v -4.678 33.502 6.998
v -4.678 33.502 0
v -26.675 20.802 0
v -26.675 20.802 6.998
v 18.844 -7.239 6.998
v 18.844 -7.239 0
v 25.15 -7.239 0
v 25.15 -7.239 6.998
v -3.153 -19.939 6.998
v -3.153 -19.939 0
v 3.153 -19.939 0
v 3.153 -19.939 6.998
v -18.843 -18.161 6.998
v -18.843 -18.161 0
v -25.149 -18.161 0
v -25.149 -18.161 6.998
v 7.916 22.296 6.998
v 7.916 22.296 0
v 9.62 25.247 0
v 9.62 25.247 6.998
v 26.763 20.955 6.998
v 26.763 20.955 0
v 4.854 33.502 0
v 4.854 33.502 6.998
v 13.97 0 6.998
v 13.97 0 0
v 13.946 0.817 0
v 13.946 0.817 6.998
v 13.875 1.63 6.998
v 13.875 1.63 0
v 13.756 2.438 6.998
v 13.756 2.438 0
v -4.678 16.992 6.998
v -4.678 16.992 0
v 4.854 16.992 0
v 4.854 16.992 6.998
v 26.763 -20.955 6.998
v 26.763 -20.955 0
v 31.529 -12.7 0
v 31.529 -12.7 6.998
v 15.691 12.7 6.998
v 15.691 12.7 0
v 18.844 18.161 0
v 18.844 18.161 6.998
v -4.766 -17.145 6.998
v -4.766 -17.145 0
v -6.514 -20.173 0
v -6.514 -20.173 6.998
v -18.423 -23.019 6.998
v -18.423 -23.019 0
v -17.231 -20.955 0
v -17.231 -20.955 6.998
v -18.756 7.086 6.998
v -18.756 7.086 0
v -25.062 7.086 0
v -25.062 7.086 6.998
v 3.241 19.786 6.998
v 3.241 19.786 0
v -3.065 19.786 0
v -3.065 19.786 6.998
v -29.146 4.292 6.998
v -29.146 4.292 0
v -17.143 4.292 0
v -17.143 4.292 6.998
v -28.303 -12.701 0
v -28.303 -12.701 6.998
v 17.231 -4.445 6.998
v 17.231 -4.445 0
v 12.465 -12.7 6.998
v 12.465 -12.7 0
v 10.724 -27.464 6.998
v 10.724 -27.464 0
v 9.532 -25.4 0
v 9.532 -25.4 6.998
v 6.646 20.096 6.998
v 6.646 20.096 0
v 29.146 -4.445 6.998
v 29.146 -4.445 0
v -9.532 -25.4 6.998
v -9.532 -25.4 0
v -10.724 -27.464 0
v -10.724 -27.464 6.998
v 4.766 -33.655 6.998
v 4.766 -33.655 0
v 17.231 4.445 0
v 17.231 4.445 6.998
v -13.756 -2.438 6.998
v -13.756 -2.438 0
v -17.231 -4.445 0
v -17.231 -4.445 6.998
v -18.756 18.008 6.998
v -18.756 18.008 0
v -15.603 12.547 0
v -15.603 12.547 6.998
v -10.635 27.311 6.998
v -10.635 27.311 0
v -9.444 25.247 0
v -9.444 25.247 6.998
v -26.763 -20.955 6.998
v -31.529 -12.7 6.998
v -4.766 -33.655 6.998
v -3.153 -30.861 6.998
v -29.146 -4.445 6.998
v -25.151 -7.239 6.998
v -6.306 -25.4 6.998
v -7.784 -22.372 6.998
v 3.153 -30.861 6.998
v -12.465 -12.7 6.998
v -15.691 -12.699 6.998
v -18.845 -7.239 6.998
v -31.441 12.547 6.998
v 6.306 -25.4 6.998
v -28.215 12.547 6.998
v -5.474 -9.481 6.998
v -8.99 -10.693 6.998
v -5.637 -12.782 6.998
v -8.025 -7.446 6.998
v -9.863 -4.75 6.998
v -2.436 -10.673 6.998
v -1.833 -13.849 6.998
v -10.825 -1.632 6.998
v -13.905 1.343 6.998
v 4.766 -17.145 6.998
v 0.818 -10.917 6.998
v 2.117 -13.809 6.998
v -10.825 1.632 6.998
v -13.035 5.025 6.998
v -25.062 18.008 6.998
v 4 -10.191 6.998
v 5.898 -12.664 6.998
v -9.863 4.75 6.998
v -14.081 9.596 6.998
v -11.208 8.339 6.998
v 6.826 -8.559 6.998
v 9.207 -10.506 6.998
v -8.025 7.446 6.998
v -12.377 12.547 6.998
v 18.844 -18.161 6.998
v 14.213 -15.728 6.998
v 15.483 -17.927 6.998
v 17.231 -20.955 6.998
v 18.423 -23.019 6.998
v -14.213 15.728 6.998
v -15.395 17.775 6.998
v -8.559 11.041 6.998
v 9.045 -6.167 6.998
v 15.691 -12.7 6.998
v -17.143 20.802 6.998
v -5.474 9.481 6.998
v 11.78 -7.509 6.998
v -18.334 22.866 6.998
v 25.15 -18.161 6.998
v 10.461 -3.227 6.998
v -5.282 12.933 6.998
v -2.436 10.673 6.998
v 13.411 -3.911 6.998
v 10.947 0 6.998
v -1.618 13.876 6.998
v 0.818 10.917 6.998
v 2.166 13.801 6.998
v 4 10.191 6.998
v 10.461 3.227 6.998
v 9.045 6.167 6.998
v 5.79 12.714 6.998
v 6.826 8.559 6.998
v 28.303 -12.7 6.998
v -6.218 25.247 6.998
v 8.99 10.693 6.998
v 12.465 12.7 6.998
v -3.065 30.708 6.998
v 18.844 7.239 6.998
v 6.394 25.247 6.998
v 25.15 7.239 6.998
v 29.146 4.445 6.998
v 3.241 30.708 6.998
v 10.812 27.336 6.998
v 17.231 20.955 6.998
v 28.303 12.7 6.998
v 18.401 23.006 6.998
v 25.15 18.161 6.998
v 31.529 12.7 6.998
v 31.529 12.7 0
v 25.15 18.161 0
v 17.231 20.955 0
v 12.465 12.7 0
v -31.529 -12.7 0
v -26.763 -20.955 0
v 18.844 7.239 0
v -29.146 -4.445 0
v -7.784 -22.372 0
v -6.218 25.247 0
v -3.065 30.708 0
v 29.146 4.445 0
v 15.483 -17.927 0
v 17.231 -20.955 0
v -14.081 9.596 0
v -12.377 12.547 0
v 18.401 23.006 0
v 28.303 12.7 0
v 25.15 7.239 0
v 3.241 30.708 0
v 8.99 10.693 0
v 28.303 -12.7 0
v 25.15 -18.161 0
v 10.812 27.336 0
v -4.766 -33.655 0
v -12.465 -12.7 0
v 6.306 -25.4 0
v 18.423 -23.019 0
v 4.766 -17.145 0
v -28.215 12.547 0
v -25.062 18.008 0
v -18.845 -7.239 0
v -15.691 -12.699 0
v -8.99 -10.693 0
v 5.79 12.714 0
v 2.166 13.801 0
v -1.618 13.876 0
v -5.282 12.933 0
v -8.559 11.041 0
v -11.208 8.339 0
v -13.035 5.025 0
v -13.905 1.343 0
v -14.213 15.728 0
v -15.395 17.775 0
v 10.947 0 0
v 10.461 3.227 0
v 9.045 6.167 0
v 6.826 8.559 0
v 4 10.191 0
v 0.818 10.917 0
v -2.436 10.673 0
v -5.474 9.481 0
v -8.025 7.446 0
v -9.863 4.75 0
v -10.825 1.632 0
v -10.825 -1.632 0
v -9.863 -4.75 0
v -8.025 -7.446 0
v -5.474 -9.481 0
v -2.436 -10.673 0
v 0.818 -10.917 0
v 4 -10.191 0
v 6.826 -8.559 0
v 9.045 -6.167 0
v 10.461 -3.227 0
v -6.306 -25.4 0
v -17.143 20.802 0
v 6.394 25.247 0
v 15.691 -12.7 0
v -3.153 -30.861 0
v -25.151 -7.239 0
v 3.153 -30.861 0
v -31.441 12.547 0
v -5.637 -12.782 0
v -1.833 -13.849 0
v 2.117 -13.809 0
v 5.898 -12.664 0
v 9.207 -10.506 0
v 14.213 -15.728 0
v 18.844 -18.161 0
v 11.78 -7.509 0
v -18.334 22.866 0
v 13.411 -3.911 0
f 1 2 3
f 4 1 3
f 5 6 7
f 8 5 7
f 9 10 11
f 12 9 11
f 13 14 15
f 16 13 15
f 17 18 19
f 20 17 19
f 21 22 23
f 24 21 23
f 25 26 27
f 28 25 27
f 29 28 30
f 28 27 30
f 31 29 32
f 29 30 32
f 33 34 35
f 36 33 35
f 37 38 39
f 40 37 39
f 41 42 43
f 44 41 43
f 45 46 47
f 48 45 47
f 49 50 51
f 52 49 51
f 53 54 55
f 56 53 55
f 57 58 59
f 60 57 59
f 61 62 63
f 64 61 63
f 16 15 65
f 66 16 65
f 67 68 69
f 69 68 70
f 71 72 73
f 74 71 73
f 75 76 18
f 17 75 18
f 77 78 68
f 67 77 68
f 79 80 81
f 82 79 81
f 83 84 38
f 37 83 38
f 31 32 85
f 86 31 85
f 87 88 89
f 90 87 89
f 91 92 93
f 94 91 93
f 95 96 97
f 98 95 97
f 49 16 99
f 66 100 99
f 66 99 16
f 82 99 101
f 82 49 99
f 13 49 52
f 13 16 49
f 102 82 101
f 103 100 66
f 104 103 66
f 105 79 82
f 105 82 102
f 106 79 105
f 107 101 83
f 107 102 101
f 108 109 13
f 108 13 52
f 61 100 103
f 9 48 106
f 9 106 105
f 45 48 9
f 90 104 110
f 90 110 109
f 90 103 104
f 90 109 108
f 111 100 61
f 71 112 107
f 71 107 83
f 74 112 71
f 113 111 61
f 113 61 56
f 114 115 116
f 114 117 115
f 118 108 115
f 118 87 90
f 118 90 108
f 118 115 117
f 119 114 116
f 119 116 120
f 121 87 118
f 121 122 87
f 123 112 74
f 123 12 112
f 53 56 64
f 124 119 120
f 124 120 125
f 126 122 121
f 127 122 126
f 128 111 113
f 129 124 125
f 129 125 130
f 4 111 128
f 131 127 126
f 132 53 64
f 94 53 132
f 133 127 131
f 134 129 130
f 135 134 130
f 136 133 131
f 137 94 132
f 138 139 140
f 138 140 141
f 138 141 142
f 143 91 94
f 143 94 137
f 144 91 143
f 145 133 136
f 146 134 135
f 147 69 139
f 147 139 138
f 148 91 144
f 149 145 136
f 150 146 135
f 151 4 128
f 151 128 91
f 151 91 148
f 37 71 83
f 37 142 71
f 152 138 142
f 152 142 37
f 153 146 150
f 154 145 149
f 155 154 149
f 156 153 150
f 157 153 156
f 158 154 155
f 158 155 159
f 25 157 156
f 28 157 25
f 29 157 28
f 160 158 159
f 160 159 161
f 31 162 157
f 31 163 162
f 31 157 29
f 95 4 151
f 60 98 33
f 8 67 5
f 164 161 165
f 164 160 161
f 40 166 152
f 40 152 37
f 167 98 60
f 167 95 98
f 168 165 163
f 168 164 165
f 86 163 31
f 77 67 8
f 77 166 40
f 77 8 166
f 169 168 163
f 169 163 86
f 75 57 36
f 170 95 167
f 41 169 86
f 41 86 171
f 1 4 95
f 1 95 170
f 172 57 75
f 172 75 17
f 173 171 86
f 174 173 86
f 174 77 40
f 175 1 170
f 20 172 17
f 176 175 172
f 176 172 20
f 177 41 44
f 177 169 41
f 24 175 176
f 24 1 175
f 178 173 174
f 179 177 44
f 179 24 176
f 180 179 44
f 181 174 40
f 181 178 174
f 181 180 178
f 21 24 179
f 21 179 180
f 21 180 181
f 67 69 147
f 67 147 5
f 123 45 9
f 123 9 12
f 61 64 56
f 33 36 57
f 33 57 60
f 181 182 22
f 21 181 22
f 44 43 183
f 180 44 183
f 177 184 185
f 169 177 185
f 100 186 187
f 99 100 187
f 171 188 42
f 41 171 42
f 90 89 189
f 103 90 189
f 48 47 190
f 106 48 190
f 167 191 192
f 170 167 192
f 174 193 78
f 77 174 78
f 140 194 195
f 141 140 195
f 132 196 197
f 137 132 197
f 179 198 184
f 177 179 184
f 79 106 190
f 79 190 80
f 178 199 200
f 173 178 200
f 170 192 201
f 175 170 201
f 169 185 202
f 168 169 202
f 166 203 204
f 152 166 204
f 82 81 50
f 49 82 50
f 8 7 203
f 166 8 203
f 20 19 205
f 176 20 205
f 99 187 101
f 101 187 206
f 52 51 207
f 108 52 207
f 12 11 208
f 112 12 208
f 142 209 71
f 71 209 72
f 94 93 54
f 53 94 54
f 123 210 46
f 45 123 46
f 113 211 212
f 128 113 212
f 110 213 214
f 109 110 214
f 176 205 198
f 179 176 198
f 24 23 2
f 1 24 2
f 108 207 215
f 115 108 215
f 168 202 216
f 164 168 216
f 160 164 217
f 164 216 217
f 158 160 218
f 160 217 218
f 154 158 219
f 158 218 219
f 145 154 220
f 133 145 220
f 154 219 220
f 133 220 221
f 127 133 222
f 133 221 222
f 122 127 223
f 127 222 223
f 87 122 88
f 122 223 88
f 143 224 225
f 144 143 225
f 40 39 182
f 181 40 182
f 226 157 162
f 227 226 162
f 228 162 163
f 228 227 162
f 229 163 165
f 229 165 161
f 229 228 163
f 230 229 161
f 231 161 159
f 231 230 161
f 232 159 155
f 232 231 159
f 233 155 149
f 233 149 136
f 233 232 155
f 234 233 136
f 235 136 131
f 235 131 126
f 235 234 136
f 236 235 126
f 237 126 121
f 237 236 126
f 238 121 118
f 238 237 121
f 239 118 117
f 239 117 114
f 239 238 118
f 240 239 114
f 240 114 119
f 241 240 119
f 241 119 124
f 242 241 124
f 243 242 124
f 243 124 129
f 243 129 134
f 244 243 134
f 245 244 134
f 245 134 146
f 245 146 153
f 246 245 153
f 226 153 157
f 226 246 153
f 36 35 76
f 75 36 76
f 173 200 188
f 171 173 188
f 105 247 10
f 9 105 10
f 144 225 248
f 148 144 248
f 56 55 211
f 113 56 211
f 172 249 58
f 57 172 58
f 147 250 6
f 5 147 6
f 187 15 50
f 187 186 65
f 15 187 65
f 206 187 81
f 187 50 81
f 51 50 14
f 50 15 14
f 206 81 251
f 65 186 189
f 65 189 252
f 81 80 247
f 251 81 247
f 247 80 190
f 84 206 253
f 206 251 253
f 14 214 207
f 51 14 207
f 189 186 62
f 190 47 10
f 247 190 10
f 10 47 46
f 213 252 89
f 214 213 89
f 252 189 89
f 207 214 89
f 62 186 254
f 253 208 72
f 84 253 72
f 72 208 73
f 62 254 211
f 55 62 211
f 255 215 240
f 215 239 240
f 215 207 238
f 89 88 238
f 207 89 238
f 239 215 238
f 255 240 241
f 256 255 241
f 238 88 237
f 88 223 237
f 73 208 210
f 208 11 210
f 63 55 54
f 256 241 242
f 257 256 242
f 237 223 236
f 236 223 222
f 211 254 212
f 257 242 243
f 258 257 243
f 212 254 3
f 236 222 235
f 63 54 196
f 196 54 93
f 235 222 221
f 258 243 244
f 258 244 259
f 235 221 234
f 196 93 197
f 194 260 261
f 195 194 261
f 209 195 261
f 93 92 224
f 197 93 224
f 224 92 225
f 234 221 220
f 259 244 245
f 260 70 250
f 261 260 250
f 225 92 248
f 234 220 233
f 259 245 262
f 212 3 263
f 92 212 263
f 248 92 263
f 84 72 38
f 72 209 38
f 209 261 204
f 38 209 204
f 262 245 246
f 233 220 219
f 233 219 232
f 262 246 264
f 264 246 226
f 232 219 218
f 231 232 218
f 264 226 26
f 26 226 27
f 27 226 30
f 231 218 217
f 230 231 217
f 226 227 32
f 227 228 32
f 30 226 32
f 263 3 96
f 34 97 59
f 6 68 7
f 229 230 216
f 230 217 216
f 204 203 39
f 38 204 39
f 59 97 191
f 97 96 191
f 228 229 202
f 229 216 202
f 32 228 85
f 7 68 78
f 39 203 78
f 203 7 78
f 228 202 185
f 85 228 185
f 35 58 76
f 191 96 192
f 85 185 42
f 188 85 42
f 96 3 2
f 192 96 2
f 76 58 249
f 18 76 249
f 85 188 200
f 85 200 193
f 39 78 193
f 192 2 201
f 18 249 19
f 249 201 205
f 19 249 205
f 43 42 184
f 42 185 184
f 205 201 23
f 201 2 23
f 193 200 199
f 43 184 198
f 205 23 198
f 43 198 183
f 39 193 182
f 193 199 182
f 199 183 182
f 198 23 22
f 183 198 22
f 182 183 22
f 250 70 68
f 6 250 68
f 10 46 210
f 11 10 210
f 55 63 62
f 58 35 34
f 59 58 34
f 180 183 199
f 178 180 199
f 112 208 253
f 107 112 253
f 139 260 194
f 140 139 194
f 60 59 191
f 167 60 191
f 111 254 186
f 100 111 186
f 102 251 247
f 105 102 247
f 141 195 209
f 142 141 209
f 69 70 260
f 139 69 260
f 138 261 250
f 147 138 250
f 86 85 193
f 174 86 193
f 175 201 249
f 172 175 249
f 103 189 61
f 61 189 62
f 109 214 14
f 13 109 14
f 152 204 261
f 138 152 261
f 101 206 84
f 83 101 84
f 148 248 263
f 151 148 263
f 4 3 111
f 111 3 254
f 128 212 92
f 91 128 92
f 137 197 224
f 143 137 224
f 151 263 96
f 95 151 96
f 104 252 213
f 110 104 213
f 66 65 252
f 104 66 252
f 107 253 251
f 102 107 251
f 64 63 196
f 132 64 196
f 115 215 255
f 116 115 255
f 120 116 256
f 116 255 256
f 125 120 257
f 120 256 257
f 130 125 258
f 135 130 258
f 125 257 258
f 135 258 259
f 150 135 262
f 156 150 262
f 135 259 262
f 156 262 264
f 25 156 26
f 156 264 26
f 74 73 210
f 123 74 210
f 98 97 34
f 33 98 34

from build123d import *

# Parameters (mm, degrees)
F0_R     = 11.0786603321
F0_R_2   = 10.9474
F1_DEPTH = 6.9977
F2_R     = 13.2854455685
F2_R_2   = 11.176
F3_DEPTH = 6.9977


# Not quite as in the source:
# - a feature names something its author has since deleted; it is built from what else it names


with BuildPart() as f1:
    # F0 (on Top) → F1 (new body)
    with BuildSketch(Plane.XY):
        with BuildLine():
            ThreePointArc((8.9895158912, 10.693432753), (-6.985, 12.0983748909), (-13.7555423633, -2.438432753))
            ThreePointArc((-13.7555423633, -2.438432753), (-12.0983748909, -6.985), (-8.9895158912, -10.693432753))
            ThreePointArc((-8.9895158912, -10.693432753), (5.8981930708, -12.6638153216), (13.97, 0))
            ThreePointArc((13.97, 0), (13.9162823127, 1.2239226251), (13.7555423633, 2.438432753))
            ThreePointArc((13.7555423633, 2.438432753), (13.347336888, 4.1242572662), (12.7333664349, 5.7465014779))
            ThreePointArc((12.7333664349, 5.7465014779), (11.139521372, 8.4304189458), (8.9895158912, 10.693432753))
        make_face()
        Circle(F0_R, mode=Mode.SUBTRACT)
        Circle(F0_R)
        Circle(F0_R_2, mode=Mode.SUBTRACT)
        Polygon((-14.0807527651, 9.595996083), (-12.3768237899, 12.5472876405), (-14.2130055479, 15.7276477372), (-15.394837026, 17.7746399033), (-17.1428502621, 20.8022876405), (-21.9088767342, 20.8022876405), (-26.6749032064, 20.8022876405), (-31.4409296786, 12.5472876405), (-29.1460849644, 8.5725), (-26.6749032064, 4.2922876405), (-17.1428502621, 4.2922876405), (-15.3507527651, 7.3962915574), align=None)
        Polygon((-18.7559669142, 18.0082876405), (-15.6030570942, 12.5472876405), (-18.7559669142, 7.0862876405), (-25.0617865543, 7.0862876405), (-28.2146963743, 12.5472876405), (-25.0617865543, 18.0082876405), align=None, mode=Mode.SUBTRACT)
        Polygon((4.854194994, 33.5022876405), (-4.6778579503, 33.5022876405), (-7.0608711864, 29.3747876405), (-9.4438844224, 25.2472876405), (-4.6778579503, 16.9922876405), (-1.27, 16.9922876405), (1.27, 16.9922876405), (4.854194994, 16.9922876405), (6.6462924911, 20.0962915574), (7.9162924911, 22.295996083), (9.6202214662, 25.2472876405), (7.2372082301, 29.3747876405), align=None)
        Polygon((6.393988162, 25.2472876405), (3.2410783419, 19.7862876405), (-3.0647412982, 19.7862876405), (-6.2176511182, 25.2472876405), (-3.0647412982, 30.7082876405), (3.2410783419, 30.7082876405), align=None, mode=Mode.SUBTRACT)
        Polygon((-29.1460849644, -8.5725), (-31.5290982004, -12.7), (-26.7630717283, -20.955), (-21.9970452561, -20.955), (-17.231018784, -20.955), (-12.4649923118, -12.7), (-14.2130055479, -9.6723522628), (-15.4830055479, -7.4726477372), (-17.231018784, -4.445), (-20.7270452561, -4.445), (-23.2670452561, -4.445), (-26.7630717283, -4.445), align=None)
        Polygon((-25.150604473, -7.2393749809), (-18.8447848775, -7.2386250963), (-15.6912256606, -12.6992501153), (-18.8434860392, -18.1606250191), (-25.1493056347, -18.1613749037), (-28.3028648516, -12.7007498847), align=None, mode=Mode.SUBTRACT)
        Polygon((31.5290982004, 12.7), (26.7630717283, 20.955), (21.9970452561, 20.955), (17.231018784, 20.955), (12.4649923118, 12.7), (14.2130055479, 9.6723522628), (15.4830055479, 7.4726477372), (17.231018784, 4.445), (20.7270452561, 4.445), (23.2670452561, 4.445), (26.7630717283, 4.445), (29.1460849644, 8.5725), align=None)
        Polygon((25.1499550762, 7.239), (18.8441354361, 7.239), (15.691225616, 12.7), (18.8441354361, 18.161), (25.1499550762, 18.161), (28.3028648962, 12.7), align=None, mode=Mode.SUBTRACT)
        Polygon((-7.1490397082, -29.5275), (-4.7660264722, -33.655), (4.7660264722, -33.655), (7.1490397082, -29.5275), (9.5320529443, -25.4), (4.7660264722, -17.145), (1.27, -17.145), (-1.27, -17.145), (-4.7660264722, -17.145), (-6.5140397082, -20.1726477372), (-7.7840397082, -22.3723522628), (-9.5320529443, -25.4), align=None)
        Polygon((-6.3058196401, -25.4), (-3.15290982, -19.939), (3.15290982, -19.939), (6.3058196401, -25.4), (3.15290982, -30.861), (-3.15290982, -30.861), align=None, mode=Mode.SUBTRACT)
        Polygon((26.7630717283, -20.955), (31.5290982004, -12.7), (29.1460849644, -8.5725), (26.7630717283, -4.445), (17.231018784, -4.445), (12.4649923118, -12.7), (14.2130055479, -15.7276477372), (15.4830055479, -17.9273522628), (17.231018784, -20.955), (21.9970452561, -20.955), align=None)
        Polygon((18.8441354361, -18.161), (15.691225616, -12.7), (18.8441354361, -7.239), (25.1499550762, -7.239), (28.3028648962, -12.7), (25.1499550762, -18.161), align=None, mode=Mode.SUBTRACT)
        Polygon((-26.6749032064, 20.8022876405), (-21.9088767342, 20.8022876405), (-18.3343568801, 22.8660376405), (-10.6353910405, 27.3110376405), (-7.0608711864, 29.3747876405), (-4.6778579503, 33.5022876405), align=None)
        Polygon((-21.9970452561, -20.955), (-26.7630717283, -20.955), (-4.7660264722, -33.655), (-7.1490397082, -29.5275), (-10.7235595624, -27.46375), (-18.422525402, -23.01875), align=None)
        Polygon((31.5290982004, -12.7), (31.5290982004, 12.7), (29.1460849644, 8.5725), (29.1460849644, 4.445), (29.1460849644, -4.445), (29.1460849644, -8.5725), align=None)
        Polygon((7.1490397082, -29.5275), (4.7660264722, -33.655), (26.7630717283, -20.955), (21.9970452561, -20.955), (18.422525402, -23.01875), (10.7235595624, -27.46375), align=None)
        Polygon((26.7630717283, 20.955), (4.854194994, 33.5022876405), (7.2372082301, 29.3747876405), (10.811599772, 27.3357666355), (18.4011736203, 23.0062743808), (21.9970452561, 20.955), align=None)
        Polygon((-29.1460849644, 4.2922876405), (-29.1460849644, 8.5725), (-31.4409296786, 12.5472876405), (-31.5290982004, -12.7), (-29.1460849644, -8.5725), (-29.1460849644, -4.445), align=None)
        with BuildLine():
            Line((-13.7555423633, -2.438432753), (-17.231018784, -4.445))
            Line((-17.231018784, -4.445), (-15.4830055479, -7.4726477372))
            Line((-15.4830055479, -7.4726477372), (-14.2130055479, -9.6723522628))
            Line((-14.2130055479, -9.6723522628), (-12.4649923118, -12.7))
            Line((-12.4649923118, -12.7), (-8.9895158912, -10.693432753))
            ThreePointArc((-8.9895158912, -10.693432753), (-12.0983748909, -6.985), (-13.7555423633, -2.438432753))
        make_face()
        with BuildLine():
            Line((14.2130055479, 9.6723522628), (12.4649923118, 12.7))
            Line((12.4649923118, 12.7), (8.9895158912, 10.693432753))
            ThreePointArc((8.9895158912, 10.693432753), (11.139521372, 8.4304189458), (12.7333664349, 5.7465014779))
            ThreePointArc((12.7333664349, 5.7465014779), (13.347336888, 4.1242572662), (13.7555423633, 2.438432753))
            Line((13.7555423633, 2.438432753), (17.231018784, 4.445))
            Line((17.231018784, 4.445), (15.4830055479, 7.4726477372))
            Line((15.4830055479, 7.4726477372), (14.2130055479, 9.6723522628))
        make_face()
        Polygon((-29.1460849644, 4.2922876405), (-26.6749032064, 4.2922876405), (-29.1460849644, 8.5725), align=None)
        Polygon((10.811599772, 27.3357666355), (7.2372082301, 29.3747876405), (9.6202214662, 25.2472876405), align=None)
        Polygon((-21.9088767342, 20.8022876405), (-17.1428502621, 20.8022876405), (-18.3343568801, 22.8660376405), align=None)
        Polygon((-7.0608711864, 29.3747876405), (-10.6353910405, 27.3110376405), (-9.4438844224, 25.2472876405), align=None)
        Polygon((29.1460849644, 4.445), (29.1460849644, 8.5725), (26.7630717283, 4.445), align=None)
        Polygon((26.7630717283, -4.445), (29.1460849644, -8.5725), (29.1460849644, -4.445), align=None)
        Polygon((18.422525402, -23.01875), (21.9970452561, -20.955), (17.231018784, -20.955), align=None)
        Polygon((9.5320529443, -25.4), (7.1490397082, -29.5275), (10.7235595624, -27.46375), align=None)
        Polygon((-10.7235595624, -27.46375), (-7.1490397082, -29.5275), (-9.5320529443, -25.4), align=None)
        Polygon((-17.231018784, -20.955), (-21.9970452561, -20.955), (-18.422525402, -23.01875), align=None)
        Polygon((-26.7630717283, -4.445), (-29.1460849644, -4.445), (-29.1460849644, -8.5725), align=None)
        Polygon((17.231018784, 20.955), (21.9970452561, 20.955), (18.4011736203, 23.0062743808), align=None)
    extrude(amount=F1_DEPTH)

    # F2 (on Top) → F3 (join)
    with BuildSketch(Plane.XY):
        Circle(F2_R)
        Circle(F2_R_2, mode=Mode.SUBTRACT)
    extrude(amount=F3_DEPTH)


solid = f1.part
